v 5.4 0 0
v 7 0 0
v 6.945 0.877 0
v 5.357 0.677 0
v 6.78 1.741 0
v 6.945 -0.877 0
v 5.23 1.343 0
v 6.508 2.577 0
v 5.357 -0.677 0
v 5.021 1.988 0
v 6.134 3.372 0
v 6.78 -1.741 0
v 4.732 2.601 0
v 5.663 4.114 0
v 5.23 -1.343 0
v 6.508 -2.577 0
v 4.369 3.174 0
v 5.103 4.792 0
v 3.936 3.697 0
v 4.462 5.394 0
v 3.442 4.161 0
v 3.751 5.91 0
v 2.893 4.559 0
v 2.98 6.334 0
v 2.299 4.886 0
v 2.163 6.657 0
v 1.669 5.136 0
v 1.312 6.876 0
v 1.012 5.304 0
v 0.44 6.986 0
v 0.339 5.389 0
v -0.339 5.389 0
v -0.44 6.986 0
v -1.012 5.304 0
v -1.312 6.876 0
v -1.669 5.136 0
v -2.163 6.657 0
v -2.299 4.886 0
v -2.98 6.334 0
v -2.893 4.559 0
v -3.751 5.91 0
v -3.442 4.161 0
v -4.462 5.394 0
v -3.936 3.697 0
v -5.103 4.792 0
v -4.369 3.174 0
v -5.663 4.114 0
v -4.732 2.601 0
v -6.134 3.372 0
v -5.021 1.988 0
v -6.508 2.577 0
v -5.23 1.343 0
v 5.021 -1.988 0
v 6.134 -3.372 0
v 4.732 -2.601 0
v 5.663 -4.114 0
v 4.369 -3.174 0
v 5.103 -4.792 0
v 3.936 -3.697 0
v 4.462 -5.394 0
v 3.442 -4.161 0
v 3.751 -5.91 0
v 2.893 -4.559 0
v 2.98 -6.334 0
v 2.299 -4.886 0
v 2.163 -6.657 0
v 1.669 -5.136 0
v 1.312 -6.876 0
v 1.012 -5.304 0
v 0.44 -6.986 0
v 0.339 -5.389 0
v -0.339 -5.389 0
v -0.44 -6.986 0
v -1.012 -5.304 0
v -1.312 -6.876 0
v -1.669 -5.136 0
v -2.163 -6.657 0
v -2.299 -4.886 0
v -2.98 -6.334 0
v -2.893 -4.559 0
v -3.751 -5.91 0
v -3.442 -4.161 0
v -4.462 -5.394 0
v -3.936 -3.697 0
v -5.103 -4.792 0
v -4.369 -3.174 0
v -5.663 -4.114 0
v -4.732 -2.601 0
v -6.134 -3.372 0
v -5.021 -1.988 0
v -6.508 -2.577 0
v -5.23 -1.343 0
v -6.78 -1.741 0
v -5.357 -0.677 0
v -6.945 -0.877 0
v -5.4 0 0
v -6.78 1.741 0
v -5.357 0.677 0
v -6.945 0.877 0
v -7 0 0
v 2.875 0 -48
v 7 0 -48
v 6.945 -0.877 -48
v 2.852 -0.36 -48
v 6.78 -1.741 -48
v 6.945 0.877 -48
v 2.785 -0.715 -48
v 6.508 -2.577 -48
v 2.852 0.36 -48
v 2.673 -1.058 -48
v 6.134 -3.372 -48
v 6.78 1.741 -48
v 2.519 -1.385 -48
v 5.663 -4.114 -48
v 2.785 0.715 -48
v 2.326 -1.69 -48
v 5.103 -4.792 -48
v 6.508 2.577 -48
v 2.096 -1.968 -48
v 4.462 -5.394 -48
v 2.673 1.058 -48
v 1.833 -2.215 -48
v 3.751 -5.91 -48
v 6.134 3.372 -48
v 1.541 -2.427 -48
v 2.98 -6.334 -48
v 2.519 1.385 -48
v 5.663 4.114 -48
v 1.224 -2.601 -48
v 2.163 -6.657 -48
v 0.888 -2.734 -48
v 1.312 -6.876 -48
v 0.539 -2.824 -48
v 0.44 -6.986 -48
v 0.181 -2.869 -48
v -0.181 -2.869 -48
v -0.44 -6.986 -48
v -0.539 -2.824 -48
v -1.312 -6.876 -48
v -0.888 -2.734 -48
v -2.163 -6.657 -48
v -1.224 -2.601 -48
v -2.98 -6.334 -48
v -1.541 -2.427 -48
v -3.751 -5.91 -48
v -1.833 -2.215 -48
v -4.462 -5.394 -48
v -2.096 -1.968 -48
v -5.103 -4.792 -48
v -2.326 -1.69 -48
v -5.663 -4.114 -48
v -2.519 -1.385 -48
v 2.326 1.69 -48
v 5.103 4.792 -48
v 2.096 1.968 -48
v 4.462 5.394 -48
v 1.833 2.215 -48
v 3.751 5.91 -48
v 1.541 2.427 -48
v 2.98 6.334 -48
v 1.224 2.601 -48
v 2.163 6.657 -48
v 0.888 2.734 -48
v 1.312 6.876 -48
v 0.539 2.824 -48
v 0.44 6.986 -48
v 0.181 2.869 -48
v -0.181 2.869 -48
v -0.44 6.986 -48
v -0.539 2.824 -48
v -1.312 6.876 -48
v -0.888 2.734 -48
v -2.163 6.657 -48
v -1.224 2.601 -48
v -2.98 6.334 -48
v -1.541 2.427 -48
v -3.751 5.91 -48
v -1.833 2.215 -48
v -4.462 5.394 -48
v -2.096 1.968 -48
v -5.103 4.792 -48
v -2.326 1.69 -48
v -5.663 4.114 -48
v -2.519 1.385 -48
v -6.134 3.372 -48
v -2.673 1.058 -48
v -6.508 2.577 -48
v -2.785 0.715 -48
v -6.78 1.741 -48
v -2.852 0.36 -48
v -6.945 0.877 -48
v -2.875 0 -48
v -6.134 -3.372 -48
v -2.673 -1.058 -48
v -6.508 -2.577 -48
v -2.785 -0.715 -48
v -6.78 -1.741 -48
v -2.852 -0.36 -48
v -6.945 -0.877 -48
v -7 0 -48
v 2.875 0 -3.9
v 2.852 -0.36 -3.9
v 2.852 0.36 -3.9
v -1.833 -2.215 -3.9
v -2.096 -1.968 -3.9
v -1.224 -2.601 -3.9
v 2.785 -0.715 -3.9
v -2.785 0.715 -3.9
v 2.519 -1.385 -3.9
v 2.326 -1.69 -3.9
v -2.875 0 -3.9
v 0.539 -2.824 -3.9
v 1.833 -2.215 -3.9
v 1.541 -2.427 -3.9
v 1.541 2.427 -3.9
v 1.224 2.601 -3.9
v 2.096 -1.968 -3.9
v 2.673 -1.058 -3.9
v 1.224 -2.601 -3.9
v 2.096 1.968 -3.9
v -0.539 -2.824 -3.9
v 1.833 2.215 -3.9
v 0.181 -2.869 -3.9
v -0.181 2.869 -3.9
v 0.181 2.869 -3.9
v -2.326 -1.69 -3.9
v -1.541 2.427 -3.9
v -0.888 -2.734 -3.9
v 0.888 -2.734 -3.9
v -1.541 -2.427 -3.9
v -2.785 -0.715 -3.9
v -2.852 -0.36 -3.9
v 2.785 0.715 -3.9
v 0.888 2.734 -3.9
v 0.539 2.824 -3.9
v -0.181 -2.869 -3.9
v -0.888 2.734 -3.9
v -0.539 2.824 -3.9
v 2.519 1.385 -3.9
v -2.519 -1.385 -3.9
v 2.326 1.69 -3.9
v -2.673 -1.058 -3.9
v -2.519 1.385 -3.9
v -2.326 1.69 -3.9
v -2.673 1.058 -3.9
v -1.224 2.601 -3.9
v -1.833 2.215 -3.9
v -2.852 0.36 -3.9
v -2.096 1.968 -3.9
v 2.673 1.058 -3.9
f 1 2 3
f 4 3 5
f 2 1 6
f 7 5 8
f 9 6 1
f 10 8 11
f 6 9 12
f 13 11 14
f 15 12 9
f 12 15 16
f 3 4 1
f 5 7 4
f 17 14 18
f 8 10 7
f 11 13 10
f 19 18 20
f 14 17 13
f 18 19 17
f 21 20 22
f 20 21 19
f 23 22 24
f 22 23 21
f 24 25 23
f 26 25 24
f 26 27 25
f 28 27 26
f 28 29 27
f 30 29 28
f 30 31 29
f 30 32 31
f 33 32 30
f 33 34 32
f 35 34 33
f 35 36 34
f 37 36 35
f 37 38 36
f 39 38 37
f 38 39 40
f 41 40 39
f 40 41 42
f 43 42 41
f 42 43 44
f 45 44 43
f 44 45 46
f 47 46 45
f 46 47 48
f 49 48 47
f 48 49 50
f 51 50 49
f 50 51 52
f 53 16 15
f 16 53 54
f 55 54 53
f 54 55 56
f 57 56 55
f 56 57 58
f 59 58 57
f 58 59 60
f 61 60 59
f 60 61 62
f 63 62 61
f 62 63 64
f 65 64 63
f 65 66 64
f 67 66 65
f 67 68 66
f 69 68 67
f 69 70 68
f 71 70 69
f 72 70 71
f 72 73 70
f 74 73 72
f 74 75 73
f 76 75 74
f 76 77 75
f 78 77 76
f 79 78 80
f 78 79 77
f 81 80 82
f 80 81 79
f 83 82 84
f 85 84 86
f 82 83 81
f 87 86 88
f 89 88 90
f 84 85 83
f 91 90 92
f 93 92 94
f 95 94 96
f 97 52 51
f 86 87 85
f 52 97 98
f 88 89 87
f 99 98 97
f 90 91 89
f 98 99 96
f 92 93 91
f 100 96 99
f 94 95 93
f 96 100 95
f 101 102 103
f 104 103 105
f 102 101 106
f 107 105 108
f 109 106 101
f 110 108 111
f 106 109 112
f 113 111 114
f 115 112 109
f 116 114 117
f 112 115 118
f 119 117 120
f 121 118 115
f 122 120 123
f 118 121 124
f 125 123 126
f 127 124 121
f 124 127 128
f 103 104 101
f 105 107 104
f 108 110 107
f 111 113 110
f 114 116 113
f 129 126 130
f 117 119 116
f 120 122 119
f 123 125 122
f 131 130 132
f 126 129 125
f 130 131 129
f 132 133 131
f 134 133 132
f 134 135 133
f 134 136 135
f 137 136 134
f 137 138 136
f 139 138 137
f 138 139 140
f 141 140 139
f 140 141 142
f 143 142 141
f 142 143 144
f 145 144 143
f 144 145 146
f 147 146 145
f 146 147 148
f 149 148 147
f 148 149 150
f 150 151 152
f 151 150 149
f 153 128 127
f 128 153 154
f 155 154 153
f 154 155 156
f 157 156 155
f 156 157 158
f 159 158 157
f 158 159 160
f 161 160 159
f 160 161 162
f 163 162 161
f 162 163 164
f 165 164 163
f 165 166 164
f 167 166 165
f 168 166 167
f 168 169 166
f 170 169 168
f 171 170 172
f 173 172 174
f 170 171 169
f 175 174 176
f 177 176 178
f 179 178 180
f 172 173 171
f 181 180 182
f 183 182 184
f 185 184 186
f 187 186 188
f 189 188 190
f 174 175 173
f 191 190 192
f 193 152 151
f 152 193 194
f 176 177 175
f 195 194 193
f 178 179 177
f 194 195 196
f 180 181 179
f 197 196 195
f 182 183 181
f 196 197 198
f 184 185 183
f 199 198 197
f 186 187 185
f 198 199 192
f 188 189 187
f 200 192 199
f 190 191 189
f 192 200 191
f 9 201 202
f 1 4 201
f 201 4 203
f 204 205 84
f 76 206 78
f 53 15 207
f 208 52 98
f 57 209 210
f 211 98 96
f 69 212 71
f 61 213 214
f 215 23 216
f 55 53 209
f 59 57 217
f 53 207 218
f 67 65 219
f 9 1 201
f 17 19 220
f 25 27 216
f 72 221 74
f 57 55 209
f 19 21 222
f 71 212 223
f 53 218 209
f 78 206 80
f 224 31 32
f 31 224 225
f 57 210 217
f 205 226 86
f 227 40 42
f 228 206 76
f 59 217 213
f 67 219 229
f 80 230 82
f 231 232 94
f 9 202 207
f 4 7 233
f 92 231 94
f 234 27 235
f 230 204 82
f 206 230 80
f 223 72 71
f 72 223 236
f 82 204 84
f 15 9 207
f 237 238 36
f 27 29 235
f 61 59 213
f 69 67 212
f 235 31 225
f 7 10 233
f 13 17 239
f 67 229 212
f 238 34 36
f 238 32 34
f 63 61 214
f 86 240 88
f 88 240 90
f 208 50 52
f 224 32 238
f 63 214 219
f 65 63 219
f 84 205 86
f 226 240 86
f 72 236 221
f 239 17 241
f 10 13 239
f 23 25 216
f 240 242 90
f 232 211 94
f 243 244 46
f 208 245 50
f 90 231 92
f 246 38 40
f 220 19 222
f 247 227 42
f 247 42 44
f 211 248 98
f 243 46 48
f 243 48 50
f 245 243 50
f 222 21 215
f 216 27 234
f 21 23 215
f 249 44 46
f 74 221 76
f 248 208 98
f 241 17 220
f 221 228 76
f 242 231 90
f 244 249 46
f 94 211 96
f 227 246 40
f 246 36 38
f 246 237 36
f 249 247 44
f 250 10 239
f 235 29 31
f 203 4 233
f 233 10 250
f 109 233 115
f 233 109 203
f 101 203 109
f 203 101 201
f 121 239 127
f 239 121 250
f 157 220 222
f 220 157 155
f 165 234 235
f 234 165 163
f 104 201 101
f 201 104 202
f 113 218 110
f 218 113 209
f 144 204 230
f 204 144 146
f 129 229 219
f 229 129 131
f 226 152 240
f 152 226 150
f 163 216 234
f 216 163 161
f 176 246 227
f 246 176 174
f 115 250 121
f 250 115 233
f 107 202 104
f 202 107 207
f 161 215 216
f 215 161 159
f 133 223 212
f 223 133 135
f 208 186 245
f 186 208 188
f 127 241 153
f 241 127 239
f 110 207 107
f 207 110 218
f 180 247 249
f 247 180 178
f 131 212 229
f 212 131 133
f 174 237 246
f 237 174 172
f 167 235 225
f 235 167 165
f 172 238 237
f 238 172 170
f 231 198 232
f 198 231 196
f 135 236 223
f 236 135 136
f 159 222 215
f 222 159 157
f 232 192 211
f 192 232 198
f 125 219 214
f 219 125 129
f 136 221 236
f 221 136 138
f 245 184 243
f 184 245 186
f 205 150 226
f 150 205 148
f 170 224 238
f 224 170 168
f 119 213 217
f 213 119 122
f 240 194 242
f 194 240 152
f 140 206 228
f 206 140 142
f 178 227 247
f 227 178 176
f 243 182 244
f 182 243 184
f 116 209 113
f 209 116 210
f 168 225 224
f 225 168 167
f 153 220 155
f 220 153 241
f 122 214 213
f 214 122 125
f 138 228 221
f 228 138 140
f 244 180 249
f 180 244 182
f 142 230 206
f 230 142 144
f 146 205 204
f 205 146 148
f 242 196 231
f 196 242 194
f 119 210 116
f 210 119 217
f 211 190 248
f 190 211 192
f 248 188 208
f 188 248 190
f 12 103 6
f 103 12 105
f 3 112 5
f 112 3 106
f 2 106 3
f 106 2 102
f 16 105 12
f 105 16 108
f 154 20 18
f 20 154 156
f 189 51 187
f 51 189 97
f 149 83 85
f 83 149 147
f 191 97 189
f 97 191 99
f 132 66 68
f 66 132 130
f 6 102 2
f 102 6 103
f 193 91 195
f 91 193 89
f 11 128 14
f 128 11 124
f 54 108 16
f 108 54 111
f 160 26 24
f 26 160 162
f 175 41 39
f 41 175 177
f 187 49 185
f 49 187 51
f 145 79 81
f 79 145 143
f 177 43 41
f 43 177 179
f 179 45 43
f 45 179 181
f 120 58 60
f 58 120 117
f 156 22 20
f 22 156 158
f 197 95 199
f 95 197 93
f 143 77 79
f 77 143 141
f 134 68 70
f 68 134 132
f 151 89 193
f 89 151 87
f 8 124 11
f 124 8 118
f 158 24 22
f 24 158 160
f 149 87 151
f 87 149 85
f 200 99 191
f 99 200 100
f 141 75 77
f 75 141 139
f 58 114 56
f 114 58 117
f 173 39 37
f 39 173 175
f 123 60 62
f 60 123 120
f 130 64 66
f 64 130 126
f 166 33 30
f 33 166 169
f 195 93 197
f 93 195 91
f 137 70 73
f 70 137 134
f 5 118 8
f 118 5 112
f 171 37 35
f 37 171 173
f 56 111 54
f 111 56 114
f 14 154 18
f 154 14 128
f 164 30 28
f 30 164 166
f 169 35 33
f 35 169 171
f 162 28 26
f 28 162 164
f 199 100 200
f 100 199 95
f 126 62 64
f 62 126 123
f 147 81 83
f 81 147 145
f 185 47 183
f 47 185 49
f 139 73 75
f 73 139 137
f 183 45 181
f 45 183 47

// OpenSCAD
$fn = 50;


difference() {
	union() {
		translate(v = [0, 0, -48.0000000000]) {
			cylinder(h = 48, r = 7.0000000000);
		}
		cylinder(h = 0, r = 13.0000000000);
	}
	union() {
		translate(v = [0, 0, 0]) {
			rotate(a = [0, 0, 0]) {
				difference() {
					union() {
						#translate(v = [0, 0, -48.0000000000]) {
							cylinder(h = 48, r = 2.6000000000);
						}
						#translate(v = [0, 0, -3.9000000000]) {
							cylinder(h = 3.9000000000, r1 = 2.8750000000, r2 = 5.4000000000);
						}
						#translate(v = [0, 0, -48.0000000000]) {
							cylinder(h = 48, r = 2.8750000000);
						}
						#translate(v = [0, 0, -48.0000000000]) {
							cylinder(h = 48, r = 2.6000000000);
						}
					}
					union();
				}
			}
		}
	}
}
